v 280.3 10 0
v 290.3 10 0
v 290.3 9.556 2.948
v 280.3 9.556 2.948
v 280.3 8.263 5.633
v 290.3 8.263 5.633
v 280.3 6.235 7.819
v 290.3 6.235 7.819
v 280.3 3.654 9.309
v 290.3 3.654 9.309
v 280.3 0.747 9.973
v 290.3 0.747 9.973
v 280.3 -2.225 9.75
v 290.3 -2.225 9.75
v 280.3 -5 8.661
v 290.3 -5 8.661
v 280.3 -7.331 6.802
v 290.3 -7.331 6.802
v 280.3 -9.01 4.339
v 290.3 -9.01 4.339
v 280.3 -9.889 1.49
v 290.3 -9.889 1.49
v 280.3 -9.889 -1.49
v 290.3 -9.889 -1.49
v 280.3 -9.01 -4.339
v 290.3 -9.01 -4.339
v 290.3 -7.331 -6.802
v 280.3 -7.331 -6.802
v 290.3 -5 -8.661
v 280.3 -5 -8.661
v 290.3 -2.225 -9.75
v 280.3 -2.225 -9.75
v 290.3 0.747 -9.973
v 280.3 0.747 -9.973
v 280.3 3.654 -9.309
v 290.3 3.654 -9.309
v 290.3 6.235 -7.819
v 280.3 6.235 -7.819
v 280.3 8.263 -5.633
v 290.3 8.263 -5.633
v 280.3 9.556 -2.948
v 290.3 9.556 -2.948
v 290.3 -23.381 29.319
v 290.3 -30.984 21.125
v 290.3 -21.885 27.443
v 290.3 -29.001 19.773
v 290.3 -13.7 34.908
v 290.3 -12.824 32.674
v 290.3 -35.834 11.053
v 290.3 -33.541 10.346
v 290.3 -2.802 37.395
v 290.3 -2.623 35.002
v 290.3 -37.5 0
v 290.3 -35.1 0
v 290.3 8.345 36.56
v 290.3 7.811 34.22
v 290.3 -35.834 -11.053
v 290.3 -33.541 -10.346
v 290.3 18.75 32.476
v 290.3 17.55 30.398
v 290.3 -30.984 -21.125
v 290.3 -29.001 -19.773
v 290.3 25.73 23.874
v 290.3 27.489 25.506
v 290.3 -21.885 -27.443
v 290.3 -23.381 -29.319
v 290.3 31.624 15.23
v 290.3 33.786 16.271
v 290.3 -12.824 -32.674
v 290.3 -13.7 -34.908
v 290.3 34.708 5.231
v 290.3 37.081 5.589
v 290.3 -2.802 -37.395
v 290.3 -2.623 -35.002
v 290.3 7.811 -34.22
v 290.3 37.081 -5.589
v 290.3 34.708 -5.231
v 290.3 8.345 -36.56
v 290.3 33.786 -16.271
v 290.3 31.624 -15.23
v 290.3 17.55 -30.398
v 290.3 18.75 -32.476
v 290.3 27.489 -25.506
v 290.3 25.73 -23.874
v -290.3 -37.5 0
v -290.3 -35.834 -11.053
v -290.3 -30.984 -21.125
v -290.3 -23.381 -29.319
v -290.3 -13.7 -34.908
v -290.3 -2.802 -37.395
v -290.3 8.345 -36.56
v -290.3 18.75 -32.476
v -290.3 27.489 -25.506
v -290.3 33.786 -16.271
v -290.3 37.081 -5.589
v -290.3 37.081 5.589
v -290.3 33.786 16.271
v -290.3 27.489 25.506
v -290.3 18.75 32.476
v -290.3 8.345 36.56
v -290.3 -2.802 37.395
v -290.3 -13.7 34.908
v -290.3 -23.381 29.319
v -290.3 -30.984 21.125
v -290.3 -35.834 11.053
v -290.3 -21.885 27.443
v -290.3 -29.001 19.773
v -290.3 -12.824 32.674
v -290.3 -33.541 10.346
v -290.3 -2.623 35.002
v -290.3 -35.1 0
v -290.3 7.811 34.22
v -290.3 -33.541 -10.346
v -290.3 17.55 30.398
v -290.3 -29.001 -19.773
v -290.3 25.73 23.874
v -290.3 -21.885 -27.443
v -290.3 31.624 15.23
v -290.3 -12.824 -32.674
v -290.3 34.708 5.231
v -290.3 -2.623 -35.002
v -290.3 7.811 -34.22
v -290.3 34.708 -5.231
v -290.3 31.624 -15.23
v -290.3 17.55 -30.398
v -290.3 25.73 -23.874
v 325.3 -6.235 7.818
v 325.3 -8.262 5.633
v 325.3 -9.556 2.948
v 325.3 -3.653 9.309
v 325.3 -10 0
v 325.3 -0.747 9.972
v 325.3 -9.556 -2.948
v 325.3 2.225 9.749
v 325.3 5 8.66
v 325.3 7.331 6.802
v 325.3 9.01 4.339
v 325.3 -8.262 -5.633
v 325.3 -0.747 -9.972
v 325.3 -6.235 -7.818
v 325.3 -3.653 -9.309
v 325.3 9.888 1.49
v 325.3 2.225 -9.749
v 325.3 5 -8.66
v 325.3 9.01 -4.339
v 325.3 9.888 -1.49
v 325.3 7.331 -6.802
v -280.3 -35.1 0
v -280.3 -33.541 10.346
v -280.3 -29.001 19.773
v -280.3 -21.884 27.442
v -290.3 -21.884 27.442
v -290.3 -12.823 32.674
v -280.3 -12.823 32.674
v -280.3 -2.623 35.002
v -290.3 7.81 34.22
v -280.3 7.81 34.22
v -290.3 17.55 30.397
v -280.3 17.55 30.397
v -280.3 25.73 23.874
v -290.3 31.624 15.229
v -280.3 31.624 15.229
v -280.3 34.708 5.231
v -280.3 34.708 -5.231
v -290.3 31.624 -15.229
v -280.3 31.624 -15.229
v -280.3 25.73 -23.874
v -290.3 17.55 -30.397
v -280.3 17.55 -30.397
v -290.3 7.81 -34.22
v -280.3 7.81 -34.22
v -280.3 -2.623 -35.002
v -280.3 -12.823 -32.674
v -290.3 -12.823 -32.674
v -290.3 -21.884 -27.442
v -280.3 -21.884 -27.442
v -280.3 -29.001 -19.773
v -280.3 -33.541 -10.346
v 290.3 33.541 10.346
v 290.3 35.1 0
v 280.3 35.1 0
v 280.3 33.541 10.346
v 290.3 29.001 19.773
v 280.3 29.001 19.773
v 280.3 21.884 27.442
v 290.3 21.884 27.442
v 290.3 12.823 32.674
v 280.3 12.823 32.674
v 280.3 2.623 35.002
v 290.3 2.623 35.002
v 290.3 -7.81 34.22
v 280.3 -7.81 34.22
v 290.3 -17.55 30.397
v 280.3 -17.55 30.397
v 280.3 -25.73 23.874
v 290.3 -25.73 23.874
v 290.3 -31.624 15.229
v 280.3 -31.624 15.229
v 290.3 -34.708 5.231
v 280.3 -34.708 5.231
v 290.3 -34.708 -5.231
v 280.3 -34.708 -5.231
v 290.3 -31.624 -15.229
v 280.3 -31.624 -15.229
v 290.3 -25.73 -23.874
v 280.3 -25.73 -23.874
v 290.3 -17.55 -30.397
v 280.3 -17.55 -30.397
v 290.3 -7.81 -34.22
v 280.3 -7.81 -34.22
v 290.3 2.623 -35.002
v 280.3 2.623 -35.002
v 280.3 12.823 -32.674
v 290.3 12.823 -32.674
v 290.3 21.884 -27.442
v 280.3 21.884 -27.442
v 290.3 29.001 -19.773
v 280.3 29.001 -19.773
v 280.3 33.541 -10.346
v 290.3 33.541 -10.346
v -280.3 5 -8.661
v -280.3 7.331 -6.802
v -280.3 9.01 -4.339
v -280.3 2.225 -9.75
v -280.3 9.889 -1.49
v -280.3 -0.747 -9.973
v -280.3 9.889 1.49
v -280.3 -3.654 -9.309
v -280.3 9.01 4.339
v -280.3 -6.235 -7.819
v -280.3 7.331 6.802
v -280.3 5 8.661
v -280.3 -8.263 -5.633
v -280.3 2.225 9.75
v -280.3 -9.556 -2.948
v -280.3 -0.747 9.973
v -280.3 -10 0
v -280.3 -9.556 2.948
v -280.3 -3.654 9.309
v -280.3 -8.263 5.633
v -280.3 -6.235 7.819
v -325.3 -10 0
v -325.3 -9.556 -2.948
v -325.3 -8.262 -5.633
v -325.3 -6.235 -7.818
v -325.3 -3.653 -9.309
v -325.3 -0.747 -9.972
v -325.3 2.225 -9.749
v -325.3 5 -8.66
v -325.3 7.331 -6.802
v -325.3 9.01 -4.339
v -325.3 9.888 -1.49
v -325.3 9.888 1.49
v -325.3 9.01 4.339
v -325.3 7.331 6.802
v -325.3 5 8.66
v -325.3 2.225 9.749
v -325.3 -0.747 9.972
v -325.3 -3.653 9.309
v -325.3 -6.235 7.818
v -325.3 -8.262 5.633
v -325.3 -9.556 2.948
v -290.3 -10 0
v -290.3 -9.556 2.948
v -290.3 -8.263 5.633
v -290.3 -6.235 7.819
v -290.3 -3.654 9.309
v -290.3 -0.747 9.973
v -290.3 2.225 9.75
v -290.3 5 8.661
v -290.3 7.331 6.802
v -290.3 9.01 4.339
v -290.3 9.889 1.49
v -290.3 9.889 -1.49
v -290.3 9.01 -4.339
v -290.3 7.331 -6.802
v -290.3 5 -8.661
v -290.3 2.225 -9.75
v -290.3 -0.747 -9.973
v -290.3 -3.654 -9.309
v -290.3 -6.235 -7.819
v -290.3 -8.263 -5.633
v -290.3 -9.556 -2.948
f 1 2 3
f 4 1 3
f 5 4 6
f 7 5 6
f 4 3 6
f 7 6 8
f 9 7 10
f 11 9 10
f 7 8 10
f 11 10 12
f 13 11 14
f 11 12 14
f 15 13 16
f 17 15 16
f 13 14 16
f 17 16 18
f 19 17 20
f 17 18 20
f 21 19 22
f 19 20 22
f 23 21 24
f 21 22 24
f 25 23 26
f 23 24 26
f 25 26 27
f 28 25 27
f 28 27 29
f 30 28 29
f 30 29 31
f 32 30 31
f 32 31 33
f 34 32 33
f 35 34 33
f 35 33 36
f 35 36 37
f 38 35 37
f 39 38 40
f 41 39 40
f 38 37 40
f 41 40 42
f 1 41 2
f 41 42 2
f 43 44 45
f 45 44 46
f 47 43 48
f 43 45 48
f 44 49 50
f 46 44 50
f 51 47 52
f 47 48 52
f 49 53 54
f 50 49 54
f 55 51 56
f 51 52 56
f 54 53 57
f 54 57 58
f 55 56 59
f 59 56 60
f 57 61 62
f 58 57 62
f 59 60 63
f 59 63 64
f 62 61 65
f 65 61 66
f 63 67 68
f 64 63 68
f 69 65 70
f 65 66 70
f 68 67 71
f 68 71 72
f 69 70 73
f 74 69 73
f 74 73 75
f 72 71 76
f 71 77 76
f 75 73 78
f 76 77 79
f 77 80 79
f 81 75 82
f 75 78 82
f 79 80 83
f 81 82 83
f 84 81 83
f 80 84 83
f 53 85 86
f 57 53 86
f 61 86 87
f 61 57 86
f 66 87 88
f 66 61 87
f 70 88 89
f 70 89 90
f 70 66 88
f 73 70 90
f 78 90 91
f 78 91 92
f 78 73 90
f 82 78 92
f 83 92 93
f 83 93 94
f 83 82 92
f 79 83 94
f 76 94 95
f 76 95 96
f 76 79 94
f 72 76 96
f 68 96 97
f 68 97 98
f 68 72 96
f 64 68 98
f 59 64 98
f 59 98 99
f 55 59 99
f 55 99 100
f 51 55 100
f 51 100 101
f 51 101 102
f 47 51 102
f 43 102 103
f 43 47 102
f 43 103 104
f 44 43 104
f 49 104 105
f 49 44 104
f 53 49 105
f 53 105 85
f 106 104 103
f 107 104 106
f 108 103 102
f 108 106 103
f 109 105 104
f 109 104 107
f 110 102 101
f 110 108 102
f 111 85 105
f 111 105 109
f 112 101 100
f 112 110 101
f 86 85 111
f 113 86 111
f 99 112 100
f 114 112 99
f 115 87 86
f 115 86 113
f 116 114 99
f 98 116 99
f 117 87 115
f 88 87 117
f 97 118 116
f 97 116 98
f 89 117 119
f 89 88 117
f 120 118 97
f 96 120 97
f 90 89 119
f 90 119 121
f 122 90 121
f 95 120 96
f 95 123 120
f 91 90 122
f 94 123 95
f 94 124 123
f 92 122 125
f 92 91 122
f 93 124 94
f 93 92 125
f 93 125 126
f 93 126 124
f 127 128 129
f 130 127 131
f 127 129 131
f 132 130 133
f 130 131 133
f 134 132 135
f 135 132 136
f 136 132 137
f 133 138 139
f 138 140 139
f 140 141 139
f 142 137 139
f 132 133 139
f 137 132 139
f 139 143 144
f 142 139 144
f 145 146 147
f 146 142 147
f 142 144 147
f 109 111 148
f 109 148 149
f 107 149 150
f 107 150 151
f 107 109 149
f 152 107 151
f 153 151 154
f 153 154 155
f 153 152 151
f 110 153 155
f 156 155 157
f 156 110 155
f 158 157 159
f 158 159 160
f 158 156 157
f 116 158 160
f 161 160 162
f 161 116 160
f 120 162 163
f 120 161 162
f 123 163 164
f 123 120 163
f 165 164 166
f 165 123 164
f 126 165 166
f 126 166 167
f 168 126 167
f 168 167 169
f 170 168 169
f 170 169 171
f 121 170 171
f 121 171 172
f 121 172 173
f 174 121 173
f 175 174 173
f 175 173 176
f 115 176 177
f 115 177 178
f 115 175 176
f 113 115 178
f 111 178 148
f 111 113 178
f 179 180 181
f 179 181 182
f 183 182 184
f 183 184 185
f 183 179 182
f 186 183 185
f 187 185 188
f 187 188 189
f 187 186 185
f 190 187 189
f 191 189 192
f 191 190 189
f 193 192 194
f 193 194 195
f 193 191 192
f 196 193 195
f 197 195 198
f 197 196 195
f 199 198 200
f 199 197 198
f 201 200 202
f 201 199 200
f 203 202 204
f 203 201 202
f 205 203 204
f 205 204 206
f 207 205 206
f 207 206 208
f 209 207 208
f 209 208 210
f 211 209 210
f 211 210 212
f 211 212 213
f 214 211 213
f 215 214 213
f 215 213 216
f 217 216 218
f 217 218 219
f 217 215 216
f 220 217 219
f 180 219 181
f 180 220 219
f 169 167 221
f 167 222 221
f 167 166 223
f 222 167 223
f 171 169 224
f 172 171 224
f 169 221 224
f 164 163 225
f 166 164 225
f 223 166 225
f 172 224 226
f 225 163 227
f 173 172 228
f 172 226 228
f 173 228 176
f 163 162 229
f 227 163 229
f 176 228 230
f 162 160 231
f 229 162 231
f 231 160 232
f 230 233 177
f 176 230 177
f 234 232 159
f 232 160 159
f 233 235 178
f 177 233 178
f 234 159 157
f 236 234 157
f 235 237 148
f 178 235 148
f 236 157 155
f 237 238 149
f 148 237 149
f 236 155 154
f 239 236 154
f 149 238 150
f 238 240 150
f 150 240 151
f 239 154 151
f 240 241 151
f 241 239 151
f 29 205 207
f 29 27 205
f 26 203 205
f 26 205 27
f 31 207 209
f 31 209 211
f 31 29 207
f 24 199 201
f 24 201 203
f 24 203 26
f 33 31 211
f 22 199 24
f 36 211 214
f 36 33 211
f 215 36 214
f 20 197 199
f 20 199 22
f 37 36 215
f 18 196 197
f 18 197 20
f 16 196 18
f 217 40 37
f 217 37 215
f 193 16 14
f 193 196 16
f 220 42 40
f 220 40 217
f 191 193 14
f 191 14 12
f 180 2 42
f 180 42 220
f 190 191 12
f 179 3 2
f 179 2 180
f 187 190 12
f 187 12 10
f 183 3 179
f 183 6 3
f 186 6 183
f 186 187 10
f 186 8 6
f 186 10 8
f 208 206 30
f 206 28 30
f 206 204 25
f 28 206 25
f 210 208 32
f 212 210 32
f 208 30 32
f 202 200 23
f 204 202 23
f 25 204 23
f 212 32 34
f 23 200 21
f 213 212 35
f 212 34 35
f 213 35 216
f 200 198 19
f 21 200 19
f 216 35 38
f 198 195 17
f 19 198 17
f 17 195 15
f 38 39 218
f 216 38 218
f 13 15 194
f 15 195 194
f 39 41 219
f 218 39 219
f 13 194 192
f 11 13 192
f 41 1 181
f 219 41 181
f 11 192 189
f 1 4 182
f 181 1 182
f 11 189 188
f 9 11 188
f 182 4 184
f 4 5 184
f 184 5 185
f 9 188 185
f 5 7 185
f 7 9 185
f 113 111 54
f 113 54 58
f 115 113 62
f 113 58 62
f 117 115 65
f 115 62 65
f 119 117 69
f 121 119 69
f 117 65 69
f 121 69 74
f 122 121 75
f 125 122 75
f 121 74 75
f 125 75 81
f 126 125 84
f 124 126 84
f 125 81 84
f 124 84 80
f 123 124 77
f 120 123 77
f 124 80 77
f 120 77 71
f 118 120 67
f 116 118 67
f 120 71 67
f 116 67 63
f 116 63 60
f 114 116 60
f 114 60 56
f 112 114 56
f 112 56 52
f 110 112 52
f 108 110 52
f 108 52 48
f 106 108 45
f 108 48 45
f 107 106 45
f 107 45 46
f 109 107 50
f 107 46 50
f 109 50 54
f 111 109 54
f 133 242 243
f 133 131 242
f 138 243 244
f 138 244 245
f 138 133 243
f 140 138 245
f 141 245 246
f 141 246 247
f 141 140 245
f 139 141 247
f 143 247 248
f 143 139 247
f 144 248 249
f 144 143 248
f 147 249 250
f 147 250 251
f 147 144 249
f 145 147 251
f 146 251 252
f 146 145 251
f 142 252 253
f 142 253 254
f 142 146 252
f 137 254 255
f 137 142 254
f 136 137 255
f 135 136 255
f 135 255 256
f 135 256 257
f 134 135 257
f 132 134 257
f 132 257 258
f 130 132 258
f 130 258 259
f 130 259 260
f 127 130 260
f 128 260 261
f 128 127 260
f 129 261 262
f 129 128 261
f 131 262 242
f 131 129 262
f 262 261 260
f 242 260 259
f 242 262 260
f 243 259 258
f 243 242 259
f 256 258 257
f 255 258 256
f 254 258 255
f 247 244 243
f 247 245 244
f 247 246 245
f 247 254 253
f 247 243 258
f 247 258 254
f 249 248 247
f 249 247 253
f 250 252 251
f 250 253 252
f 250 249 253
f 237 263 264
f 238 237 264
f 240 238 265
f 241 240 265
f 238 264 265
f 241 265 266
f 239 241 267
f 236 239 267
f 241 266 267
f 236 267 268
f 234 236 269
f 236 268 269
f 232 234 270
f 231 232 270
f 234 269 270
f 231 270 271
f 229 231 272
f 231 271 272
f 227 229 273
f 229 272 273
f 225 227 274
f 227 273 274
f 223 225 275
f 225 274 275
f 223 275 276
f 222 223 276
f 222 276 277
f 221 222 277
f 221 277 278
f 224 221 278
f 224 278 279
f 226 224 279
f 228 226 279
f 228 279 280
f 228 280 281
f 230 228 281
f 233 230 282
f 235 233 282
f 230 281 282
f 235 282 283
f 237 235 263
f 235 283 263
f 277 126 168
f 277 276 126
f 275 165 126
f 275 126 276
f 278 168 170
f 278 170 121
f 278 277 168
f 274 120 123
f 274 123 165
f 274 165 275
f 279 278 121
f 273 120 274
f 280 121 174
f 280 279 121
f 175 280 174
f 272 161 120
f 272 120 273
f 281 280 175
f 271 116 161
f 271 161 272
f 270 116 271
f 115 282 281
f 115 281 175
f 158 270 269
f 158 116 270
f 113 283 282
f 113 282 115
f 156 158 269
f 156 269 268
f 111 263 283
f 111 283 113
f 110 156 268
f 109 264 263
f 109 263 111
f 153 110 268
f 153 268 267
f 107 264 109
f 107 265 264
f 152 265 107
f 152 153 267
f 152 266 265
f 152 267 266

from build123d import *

# Parameters (mm, degrees)
SKETCH1_W           = 580.6
SKETCH1_H           = 2.3995
SKETCH2_R           = 35.1
SKETCH2_R_2         = 10.0005
BOSS_EXTRUDE1_DEPTH = 10
SKETCH3_R           = 35.1
SKETCH3_R_2         = 10.0005
BOSS_EXTRUDE2_DEPTH = 10
SKETCH4_W           = 650.6
SKETCH4_H           = 10


with BuildPart() as part:
    # Sketch1 → Revolve1 (revolve)
    with BuildSketch(Plane.XY, mode=Mode.PRIVATE) as revolve1_sk:
        with Locations((0, 36.30025)):
            Rectangle(SKETCH1_W, SKETCH1_H)
    revolve(revolve1_sk.sketch.rotate(Axis((-290.3, 0, 0), (1, 0, 0)), 180), axis=Axis((-290.3, 0, 0), (1, 0, 0)))


with BuildPart() as body_2:
    # Sketch2 → Boss-Extrude1 (new body)
    with BuildSketch(Plane.ZY.offset(290.3)):
        with Locations(Location((0, 0, 0), (0, 0, 270))):
            Circle(SKETCH2_R)
        with Locations(Location((0, 0, 0), (0, 0, 270))):
            Circle(SKETCH2_R_2, mode=Mode.SUBTRACT)
    extrude(amount=-BOSS_EXTRUDE1_DEPTH)


with BuildPart() as body_3:
    # Sketch3 → Boss-Extrude2 (new body)
    with BuildSketch(Plane(origin=(290.3, 0, 0), x_dir=(0, 0, -1), z_dir=(1, 0, 0))):
        with Locations(Location((0, 0, 0), (0, 0, 90))):
            Circle(SKETCH3_R)
        with Locations(Location((0, 0, 0), (0, 0, 90))):
            Circle(SKETCH3_R_2, mode=Mode.SUBTRACT)
    extrude(amount=-BOSS_EXTRUDE2_DEPTH)


with BuildPart() as body_4:
    # Sketch4 → Revolve3 (revolve)
    with BuildSketch(Plane.XY, mode=Mode.PRIVATE) as revolve3_sk:
        with Locations((0, 5)):
            Rectangle(SKETCH4_W, SKETCH4_H)
    revolve(revolve3_sk.sketch.rotate(Axis((-325.3, 0, 0), (1, 0, 0)), 180), axis=Axis((-325.3, 0, 0), (1, 0, 0)))


solid = Compound([part.part, body_2.part, body_3.part, body_4.part])
